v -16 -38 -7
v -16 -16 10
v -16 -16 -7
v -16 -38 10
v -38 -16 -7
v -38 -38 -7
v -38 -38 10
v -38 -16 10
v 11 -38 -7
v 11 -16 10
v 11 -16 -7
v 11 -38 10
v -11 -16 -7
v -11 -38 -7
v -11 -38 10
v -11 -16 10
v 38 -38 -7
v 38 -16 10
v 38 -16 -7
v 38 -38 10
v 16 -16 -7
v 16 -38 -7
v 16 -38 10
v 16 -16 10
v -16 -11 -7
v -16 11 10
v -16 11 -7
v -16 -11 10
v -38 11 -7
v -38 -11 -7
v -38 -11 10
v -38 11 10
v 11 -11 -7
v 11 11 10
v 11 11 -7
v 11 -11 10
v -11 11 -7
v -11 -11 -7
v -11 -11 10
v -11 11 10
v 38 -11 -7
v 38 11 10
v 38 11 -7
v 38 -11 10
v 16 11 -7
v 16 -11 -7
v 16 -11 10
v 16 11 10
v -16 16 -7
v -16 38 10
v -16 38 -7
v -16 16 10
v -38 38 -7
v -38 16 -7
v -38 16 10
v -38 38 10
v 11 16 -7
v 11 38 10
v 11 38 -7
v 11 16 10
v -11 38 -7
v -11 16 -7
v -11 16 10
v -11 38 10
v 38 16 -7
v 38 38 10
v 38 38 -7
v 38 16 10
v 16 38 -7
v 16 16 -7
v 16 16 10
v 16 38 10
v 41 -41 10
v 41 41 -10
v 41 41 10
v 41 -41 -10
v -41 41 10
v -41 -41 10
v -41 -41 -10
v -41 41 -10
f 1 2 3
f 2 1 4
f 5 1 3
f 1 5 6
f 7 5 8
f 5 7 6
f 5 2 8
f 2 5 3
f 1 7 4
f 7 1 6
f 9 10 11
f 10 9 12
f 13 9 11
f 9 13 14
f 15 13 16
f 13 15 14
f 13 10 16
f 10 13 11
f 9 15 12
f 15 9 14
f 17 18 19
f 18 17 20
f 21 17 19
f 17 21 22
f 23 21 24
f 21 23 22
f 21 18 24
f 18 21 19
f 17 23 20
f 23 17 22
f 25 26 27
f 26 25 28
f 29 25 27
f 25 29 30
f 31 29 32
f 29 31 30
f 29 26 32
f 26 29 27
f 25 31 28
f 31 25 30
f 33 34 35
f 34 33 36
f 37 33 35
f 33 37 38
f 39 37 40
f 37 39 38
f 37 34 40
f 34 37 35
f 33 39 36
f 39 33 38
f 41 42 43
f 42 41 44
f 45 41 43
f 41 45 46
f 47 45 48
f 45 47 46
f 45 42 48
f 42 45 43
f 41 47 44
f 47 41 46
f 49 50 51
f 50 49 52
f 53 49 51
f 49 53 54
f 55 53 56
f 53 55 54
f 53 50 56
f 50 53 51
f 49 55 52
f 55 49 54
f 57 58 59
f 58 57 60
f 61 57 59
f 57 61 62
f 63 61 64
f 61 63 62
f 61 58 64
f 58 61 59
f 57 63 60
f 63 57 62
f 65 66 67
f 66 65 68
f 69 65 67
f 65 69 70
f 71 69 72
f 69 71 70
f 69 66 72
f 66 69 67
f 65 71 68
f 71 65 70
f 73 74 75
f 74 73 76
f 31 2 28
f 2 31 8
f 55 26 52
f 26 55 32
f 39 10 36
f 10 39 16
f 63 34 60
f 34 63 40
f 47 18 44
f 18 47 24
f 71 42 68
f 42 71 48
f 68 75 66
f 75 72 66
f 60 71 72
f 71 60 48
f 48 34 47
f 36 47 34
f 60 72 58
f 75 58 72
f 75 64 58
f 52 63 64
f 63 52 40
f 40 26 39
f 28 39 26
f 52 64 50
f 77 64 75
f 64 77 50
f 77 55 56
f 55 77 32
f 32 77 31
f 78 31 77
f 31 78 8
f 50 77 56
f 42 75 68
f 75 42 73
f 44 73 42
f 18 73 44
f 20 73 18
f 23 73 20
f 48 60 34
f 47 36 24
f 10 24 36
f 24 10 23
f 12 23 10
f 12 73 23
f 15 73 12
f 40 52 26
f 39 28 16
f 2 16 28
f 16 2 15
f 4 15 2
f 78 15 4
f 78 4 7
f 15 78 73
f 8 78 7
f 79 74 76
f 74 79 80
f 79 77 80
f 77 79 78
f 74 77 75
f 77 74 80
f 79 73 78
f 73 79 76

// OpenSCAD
$fn = 32;

// ----------------------------------------------------------------------
// Pocket plate 82 x 82 x 20
// 3 x 3 pockets 22 mm square, 17 mm deep
// ----------------------------------------------------------------------

// --- parameters (mm) ---
thickness = 20;  // plate thickness
floor_t = 3;     // material left under each pocket
pocket = 22;     // pocket side length
pitch_x = 27;    // pocket pitch along X
pitch_y = 27;    // pocket pitch along Y
cols = 3;        // pockets per row
rows = 3;        // rows of pockets

// --- derived feature positions (mm) ---
depth = thickness - floor_t;        // = 17   pocket depth, down to the floor
span_x = (cols - 1) * pitch_x;      // = 54   distance between outer pockets
span_y = (rows - 1) * pitch_y;      // = 54   distance between outer pocket rows
origin_x = -span_x / 2;             // = -27   X of the first pocket
origin_y = -span_y / 2;             // = -27   Y of the first pocket
plate = [span_x + pocket + 6, span_y + pocket + 6, thickness];  // = [82, 82, 20]   overall size: pockets plus 3 mm of wall on each side
feature_centers = [
  [origin_x + 0 * pitch_x, origin_y + 0 * pitch_y],
  [origin_x + 1 * pitch_x, origin_y + 0 * pitch_y],
  [origin_x + 2 * pitch_x, origin_y + 0 * pitch_y],
  [origin_x + 0 * pitch_x, origin_y + 1 * pitch_y],
  [origin_x + 1 * pitch_x, origin_y + 1 * pitch_y],
  [origin_x + 2 * pitch_x, origin_y + 1 * pitch_y],
  [origin_x + 0 * pitch_x, origin_y + 2 * pitch_y],
  [origin_x + 1 * pitch_x, origin_y + 2 * pitch_y],
  [origin_x + 2 * pitch_x, origin_y + 2 * pitch_y]
];   // pocket centres, used verbatim by the cutter loop

// plate outline, then one pocket per centre in feature_centers
difference() {
  cube(plate, center = true);
  for (centre = feature_centers)
    translate([centre[0] - pocket / 2, centre[1] - pocket / 2, plate[2] / 2 - depth])
      cube([pocket, pocket, depth + 1]);  // centred on the declared pocket centre
}
